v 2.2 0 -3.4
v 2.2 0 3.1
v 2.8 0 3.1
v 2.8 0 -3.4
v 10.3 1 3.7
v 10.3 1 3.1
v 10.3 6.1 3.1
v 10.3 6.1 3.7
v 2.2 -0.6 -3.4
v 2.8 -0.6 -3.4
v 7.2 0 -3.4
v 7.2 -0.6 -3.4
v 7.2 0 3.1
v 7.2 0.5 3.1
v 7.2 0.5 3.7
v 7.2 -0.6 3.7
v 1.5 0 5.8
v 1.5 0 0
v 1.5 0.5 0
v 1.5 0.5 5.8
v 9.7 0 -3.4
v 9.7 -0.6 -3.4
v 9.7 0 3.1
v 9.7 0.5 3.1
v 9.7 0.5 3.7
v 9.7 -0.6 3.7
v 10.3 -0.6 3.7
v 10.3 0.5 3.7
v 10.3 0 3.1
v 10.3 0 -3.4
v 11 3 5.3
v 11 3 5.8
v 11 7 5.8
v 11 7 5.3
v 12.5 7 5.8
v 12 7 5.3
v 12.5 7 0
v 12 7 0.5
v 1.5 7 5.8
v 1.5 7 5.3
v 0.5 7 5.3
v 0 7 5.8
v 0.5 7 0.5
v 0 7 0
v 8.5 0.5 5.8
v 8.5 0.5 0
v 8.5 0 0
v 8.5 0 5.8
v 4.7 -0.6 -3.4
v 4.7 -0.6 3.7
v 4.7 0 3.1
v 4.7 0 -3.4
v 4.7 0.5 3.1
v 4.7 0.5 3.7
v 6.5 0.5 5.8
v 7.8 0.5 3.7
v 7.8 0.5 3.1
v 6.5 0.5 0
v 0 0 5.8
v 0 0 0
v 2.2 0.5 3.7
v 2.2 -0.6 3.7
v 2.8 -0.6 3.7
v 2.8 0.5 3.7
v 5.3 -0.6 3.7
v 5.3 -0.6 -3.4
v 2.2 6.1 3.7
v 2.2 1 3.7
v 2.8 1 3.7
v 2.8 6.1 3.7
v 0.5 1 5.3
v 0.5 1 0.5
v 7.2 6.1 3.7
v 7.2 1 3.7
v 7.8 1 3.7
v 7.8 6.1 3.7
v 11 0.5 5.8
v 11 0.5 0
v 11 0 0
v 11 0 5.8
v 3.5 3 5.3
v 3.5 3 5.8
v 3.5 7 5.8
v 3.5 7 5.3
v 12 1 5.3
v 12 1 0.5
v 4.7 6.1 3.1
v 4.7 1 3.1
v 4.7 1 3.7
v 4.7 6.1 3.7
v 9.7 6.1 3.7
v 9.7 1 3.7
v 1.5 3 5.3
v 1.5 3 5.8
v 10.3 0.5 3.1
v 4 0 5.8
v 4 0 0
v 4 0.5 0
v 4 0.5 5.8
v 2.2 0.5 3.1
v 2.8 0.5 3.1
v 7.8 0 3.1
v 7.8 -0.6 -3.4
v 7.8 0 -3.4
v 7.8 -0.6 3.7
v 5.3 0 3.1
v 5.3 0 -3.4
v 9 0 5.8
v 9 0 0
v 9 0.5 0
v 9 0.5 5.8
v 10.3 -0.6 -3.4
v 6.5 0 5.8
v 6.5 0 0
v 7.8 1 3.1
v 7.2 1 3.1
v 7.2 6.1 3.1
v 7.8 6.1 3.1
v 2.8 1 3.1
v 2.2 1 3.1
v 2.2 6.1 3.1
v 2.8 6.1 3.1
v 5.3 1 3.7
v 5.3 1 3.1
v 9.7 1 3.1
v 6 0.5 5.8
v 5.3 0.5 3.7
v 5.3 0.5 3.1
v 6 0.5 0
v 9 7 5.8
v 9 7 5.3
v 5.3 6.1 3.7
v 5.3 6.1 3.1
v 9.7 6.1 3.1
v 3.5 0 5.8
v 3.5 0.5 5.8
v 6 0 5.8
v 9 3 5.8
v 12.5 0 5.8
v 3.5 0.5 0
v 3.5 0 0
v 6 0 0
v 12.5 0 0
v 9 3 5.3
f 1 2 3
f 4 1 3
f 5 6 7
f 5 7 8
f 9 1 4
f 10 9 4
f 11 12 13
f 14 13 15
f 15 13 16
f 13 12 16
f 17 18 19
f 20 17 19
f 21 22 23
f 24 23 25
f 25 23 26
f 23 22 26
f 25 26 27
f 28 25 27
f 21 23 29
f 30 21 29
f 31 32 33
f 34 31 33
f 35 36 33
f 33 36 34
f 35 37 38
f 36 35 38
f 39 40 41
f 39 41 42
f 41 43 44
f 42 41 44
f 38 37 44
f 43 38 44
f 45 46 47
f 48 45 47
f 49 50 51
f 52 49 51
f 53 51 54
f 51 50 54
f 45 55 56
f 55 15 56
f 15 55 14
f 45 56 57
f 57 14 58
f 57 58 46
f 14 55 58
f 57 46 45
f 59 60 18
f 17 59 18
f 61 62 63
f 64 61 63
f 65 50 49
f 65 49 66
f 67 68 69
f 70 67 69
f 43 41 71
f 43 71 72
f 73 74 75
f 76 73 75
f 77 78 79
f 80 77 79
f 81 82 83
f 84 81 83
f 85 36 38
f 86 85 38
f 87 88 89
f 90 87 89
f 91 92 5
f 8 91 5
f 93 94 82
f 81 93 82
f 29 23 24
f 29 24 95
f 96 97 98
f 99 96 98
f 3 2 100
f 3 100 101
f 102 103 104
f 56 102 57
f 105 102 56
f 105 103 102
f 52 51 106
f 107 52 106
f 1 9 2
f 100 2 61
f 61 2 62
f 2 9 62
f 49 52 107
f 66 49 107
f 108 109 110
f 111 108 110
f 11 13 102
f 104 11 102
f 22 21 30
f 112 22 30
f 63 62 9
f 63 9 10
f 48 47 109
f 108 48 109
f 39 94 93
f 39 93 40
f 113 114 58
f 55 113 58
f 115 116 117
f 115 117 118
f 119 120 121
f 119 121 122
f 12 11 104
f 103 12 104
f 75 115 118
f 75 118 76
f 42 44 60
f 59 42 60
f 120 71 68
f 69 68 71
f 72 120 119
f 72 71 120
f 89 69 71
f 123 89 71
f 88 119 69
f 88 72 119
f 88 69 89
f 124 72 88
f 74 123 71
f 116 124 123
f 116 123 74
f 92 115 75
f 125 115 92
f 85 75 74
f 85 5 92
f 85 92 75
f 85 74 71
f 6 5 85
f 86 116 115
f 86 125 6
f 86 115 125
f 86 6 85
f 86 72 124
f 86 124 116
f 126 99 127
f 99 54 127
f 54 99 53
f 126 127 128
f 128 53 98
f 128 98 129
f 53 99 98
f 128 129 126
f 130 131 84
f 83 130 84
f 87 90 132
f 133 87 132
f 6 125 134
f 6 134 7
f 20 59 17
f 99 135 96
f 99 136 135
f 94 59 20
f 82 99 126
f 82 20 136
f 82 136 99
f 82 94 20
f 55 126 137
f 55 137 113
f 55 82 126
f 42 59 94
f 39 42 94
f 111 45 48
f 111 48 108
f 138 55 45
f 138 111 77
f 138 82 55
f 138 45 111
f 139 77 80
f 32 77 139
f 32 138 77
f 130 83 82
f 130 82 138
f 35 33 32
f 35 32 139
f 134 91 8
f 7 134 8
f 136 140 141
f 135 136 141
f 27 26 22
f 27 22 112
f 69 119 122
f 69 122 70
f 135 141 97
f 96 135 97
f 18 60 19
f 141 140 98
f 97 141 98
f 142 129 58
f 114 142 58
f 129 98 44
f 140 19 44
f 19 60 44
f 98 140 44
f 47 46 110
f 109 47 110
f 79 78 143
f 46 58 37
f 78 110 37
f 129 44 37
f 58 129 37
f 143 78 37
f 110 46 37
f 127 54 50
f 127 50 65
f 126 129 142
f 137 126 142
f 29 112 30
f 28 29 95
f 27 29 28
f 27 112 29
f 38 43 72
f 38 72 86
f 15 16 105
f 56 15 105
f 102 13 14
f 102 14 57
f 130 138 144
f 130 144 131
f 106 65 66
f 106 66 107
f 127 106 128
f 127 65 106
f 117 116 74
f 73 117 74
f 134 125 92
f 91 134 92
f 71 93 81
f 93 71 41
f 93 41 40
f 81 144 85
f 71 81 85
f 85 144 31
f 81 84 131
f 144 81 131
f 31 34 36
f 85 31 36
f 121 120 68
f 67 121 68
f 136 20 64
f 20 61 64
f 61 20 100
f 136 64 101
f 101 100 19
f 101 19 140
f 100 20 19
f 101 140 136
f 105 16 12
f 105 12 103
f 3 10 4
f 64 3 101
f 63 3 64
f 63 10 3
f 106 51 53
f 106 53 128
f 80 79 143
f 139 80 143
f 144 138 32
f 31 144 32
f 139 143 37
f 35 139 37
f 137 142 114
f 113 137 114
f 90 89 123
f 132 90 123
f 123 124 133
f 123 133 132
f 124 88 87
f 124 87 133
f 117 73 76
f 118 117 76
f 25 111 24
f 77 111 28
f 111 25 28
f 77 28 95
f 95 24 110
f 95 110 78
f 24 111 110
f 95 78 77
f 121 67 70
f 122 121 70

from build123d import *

# Parameters (mm, degrees)
EXTRUDE_1_DEPTH     = 5.8
SKETCH_2_W          = 11.5
SKETCH_2_H          = 4.8
CUT_EXTRUDE_1_DEPTH = 6
SKETCH_3_W          = 0.6
SKETCH_3_H          = 0.6
EXTRUDE_2_DEPTH     = 6.1
SKETCH_4_W          = 0.6
SKETCH_4_H          = 0.6
EXTRUDE_3_DEPTH     = 7.1
SKETCH_5_W          = 2
SKETCH_5_H          = 4
CUT_EXTRUDE_2_DEPTH = 1


with BuildPart() as part:
    # 草图1 → 凸台-拉伸1 (new body)
    with BuildSketch(Plane.XY):
        Polygon((4, 0), (4, 0.5), (6, 0.5), (6, 0), (6.5, 0), (6.5, 0.5), (8.5, 0.5), (8.5, 0), (9, 0), (9, 0.5), (11, 0.5), (11, 0), (12.5, 0), (12.5, 7), (0, 7), (0, 0), (1.5, 0), (1.5, 0.5), (3.5, 0.5), (3.5, 0), align=None)
    extrude(amount=EXTRUDE_1_DEPTH)

    # 草图2 → 切除-拉伸1 (cut)
    with BuildSketch(Plane(origin=(0, 7, 0), x_dir=(1, 0, 0), z_dir=(0, 1, 0))):
        with Locations((6.25, -2.9)):
            Rectangle(SKETCH_2_W, SKETCH_2_H)
    extrude(amount=-CUT_EXTRUDE_1_DEPTH, mode=Mode.SUBTRACT)

    # 草图3 → 凸台-拉伸2 (add)
    with BuildSketch(Plane.XZ):
        with Locations((5, 3.4)):
            Rectangle(SKETCH_3_W, SKETCH_3_H)
        with Locations((7.5, 3.4)):
            Rectangle(SKETCH_3_W, SKETCH_3_H)
        with Locations((2.5, 3.4)):
            Rectangle(SKETCH_3_W, SKETCH_3_H)
        with Locations((10, 3.4)):
            Rectangle(SKETCH_3_W, SKETCH_3_H)
    extrude(amount=-EXTRUDE_2_DEPTH)

    # 草图4 → 凸台-拉伸3 (add)
    with BuildSketch(Plane.XY.offset(3.7)):
        with Locations((5, -0.3)):
            Rectangle(SKETCH_4_W, SKETCH_4_H)
        with Locations((7.5, -0.3)):
            Rectangle(SKETCH_4_W, SKETCH_4_H)
        with Locations((2.5, -0.3)):
            Rectangle(SKETCH_4_W, SKETCH_4_H)
        with Locations((10, -0.3)):
            Rectangle(SKETCH_4_W, SKETCH_4_H)
    extrude(amount=-EXTRUDE_3_DEPTH)

    # 草图5 → 切除-拉伸2 (cut)
    with BuildSketch(Plane.XY.offset(5.8)):
        with Locations((2.5, 5)):
            Rectangle(SKETCH_5_W, SKETCH_5_H)
        with Locations((10, 5)):
            Rectangle(SKETCH_5_W, SKETCH_5_H)
    extrude(amount=-CUT_EXTRUDE_2_DEPTH, mode=Mode.SUBTRACT)


solid = part.part
